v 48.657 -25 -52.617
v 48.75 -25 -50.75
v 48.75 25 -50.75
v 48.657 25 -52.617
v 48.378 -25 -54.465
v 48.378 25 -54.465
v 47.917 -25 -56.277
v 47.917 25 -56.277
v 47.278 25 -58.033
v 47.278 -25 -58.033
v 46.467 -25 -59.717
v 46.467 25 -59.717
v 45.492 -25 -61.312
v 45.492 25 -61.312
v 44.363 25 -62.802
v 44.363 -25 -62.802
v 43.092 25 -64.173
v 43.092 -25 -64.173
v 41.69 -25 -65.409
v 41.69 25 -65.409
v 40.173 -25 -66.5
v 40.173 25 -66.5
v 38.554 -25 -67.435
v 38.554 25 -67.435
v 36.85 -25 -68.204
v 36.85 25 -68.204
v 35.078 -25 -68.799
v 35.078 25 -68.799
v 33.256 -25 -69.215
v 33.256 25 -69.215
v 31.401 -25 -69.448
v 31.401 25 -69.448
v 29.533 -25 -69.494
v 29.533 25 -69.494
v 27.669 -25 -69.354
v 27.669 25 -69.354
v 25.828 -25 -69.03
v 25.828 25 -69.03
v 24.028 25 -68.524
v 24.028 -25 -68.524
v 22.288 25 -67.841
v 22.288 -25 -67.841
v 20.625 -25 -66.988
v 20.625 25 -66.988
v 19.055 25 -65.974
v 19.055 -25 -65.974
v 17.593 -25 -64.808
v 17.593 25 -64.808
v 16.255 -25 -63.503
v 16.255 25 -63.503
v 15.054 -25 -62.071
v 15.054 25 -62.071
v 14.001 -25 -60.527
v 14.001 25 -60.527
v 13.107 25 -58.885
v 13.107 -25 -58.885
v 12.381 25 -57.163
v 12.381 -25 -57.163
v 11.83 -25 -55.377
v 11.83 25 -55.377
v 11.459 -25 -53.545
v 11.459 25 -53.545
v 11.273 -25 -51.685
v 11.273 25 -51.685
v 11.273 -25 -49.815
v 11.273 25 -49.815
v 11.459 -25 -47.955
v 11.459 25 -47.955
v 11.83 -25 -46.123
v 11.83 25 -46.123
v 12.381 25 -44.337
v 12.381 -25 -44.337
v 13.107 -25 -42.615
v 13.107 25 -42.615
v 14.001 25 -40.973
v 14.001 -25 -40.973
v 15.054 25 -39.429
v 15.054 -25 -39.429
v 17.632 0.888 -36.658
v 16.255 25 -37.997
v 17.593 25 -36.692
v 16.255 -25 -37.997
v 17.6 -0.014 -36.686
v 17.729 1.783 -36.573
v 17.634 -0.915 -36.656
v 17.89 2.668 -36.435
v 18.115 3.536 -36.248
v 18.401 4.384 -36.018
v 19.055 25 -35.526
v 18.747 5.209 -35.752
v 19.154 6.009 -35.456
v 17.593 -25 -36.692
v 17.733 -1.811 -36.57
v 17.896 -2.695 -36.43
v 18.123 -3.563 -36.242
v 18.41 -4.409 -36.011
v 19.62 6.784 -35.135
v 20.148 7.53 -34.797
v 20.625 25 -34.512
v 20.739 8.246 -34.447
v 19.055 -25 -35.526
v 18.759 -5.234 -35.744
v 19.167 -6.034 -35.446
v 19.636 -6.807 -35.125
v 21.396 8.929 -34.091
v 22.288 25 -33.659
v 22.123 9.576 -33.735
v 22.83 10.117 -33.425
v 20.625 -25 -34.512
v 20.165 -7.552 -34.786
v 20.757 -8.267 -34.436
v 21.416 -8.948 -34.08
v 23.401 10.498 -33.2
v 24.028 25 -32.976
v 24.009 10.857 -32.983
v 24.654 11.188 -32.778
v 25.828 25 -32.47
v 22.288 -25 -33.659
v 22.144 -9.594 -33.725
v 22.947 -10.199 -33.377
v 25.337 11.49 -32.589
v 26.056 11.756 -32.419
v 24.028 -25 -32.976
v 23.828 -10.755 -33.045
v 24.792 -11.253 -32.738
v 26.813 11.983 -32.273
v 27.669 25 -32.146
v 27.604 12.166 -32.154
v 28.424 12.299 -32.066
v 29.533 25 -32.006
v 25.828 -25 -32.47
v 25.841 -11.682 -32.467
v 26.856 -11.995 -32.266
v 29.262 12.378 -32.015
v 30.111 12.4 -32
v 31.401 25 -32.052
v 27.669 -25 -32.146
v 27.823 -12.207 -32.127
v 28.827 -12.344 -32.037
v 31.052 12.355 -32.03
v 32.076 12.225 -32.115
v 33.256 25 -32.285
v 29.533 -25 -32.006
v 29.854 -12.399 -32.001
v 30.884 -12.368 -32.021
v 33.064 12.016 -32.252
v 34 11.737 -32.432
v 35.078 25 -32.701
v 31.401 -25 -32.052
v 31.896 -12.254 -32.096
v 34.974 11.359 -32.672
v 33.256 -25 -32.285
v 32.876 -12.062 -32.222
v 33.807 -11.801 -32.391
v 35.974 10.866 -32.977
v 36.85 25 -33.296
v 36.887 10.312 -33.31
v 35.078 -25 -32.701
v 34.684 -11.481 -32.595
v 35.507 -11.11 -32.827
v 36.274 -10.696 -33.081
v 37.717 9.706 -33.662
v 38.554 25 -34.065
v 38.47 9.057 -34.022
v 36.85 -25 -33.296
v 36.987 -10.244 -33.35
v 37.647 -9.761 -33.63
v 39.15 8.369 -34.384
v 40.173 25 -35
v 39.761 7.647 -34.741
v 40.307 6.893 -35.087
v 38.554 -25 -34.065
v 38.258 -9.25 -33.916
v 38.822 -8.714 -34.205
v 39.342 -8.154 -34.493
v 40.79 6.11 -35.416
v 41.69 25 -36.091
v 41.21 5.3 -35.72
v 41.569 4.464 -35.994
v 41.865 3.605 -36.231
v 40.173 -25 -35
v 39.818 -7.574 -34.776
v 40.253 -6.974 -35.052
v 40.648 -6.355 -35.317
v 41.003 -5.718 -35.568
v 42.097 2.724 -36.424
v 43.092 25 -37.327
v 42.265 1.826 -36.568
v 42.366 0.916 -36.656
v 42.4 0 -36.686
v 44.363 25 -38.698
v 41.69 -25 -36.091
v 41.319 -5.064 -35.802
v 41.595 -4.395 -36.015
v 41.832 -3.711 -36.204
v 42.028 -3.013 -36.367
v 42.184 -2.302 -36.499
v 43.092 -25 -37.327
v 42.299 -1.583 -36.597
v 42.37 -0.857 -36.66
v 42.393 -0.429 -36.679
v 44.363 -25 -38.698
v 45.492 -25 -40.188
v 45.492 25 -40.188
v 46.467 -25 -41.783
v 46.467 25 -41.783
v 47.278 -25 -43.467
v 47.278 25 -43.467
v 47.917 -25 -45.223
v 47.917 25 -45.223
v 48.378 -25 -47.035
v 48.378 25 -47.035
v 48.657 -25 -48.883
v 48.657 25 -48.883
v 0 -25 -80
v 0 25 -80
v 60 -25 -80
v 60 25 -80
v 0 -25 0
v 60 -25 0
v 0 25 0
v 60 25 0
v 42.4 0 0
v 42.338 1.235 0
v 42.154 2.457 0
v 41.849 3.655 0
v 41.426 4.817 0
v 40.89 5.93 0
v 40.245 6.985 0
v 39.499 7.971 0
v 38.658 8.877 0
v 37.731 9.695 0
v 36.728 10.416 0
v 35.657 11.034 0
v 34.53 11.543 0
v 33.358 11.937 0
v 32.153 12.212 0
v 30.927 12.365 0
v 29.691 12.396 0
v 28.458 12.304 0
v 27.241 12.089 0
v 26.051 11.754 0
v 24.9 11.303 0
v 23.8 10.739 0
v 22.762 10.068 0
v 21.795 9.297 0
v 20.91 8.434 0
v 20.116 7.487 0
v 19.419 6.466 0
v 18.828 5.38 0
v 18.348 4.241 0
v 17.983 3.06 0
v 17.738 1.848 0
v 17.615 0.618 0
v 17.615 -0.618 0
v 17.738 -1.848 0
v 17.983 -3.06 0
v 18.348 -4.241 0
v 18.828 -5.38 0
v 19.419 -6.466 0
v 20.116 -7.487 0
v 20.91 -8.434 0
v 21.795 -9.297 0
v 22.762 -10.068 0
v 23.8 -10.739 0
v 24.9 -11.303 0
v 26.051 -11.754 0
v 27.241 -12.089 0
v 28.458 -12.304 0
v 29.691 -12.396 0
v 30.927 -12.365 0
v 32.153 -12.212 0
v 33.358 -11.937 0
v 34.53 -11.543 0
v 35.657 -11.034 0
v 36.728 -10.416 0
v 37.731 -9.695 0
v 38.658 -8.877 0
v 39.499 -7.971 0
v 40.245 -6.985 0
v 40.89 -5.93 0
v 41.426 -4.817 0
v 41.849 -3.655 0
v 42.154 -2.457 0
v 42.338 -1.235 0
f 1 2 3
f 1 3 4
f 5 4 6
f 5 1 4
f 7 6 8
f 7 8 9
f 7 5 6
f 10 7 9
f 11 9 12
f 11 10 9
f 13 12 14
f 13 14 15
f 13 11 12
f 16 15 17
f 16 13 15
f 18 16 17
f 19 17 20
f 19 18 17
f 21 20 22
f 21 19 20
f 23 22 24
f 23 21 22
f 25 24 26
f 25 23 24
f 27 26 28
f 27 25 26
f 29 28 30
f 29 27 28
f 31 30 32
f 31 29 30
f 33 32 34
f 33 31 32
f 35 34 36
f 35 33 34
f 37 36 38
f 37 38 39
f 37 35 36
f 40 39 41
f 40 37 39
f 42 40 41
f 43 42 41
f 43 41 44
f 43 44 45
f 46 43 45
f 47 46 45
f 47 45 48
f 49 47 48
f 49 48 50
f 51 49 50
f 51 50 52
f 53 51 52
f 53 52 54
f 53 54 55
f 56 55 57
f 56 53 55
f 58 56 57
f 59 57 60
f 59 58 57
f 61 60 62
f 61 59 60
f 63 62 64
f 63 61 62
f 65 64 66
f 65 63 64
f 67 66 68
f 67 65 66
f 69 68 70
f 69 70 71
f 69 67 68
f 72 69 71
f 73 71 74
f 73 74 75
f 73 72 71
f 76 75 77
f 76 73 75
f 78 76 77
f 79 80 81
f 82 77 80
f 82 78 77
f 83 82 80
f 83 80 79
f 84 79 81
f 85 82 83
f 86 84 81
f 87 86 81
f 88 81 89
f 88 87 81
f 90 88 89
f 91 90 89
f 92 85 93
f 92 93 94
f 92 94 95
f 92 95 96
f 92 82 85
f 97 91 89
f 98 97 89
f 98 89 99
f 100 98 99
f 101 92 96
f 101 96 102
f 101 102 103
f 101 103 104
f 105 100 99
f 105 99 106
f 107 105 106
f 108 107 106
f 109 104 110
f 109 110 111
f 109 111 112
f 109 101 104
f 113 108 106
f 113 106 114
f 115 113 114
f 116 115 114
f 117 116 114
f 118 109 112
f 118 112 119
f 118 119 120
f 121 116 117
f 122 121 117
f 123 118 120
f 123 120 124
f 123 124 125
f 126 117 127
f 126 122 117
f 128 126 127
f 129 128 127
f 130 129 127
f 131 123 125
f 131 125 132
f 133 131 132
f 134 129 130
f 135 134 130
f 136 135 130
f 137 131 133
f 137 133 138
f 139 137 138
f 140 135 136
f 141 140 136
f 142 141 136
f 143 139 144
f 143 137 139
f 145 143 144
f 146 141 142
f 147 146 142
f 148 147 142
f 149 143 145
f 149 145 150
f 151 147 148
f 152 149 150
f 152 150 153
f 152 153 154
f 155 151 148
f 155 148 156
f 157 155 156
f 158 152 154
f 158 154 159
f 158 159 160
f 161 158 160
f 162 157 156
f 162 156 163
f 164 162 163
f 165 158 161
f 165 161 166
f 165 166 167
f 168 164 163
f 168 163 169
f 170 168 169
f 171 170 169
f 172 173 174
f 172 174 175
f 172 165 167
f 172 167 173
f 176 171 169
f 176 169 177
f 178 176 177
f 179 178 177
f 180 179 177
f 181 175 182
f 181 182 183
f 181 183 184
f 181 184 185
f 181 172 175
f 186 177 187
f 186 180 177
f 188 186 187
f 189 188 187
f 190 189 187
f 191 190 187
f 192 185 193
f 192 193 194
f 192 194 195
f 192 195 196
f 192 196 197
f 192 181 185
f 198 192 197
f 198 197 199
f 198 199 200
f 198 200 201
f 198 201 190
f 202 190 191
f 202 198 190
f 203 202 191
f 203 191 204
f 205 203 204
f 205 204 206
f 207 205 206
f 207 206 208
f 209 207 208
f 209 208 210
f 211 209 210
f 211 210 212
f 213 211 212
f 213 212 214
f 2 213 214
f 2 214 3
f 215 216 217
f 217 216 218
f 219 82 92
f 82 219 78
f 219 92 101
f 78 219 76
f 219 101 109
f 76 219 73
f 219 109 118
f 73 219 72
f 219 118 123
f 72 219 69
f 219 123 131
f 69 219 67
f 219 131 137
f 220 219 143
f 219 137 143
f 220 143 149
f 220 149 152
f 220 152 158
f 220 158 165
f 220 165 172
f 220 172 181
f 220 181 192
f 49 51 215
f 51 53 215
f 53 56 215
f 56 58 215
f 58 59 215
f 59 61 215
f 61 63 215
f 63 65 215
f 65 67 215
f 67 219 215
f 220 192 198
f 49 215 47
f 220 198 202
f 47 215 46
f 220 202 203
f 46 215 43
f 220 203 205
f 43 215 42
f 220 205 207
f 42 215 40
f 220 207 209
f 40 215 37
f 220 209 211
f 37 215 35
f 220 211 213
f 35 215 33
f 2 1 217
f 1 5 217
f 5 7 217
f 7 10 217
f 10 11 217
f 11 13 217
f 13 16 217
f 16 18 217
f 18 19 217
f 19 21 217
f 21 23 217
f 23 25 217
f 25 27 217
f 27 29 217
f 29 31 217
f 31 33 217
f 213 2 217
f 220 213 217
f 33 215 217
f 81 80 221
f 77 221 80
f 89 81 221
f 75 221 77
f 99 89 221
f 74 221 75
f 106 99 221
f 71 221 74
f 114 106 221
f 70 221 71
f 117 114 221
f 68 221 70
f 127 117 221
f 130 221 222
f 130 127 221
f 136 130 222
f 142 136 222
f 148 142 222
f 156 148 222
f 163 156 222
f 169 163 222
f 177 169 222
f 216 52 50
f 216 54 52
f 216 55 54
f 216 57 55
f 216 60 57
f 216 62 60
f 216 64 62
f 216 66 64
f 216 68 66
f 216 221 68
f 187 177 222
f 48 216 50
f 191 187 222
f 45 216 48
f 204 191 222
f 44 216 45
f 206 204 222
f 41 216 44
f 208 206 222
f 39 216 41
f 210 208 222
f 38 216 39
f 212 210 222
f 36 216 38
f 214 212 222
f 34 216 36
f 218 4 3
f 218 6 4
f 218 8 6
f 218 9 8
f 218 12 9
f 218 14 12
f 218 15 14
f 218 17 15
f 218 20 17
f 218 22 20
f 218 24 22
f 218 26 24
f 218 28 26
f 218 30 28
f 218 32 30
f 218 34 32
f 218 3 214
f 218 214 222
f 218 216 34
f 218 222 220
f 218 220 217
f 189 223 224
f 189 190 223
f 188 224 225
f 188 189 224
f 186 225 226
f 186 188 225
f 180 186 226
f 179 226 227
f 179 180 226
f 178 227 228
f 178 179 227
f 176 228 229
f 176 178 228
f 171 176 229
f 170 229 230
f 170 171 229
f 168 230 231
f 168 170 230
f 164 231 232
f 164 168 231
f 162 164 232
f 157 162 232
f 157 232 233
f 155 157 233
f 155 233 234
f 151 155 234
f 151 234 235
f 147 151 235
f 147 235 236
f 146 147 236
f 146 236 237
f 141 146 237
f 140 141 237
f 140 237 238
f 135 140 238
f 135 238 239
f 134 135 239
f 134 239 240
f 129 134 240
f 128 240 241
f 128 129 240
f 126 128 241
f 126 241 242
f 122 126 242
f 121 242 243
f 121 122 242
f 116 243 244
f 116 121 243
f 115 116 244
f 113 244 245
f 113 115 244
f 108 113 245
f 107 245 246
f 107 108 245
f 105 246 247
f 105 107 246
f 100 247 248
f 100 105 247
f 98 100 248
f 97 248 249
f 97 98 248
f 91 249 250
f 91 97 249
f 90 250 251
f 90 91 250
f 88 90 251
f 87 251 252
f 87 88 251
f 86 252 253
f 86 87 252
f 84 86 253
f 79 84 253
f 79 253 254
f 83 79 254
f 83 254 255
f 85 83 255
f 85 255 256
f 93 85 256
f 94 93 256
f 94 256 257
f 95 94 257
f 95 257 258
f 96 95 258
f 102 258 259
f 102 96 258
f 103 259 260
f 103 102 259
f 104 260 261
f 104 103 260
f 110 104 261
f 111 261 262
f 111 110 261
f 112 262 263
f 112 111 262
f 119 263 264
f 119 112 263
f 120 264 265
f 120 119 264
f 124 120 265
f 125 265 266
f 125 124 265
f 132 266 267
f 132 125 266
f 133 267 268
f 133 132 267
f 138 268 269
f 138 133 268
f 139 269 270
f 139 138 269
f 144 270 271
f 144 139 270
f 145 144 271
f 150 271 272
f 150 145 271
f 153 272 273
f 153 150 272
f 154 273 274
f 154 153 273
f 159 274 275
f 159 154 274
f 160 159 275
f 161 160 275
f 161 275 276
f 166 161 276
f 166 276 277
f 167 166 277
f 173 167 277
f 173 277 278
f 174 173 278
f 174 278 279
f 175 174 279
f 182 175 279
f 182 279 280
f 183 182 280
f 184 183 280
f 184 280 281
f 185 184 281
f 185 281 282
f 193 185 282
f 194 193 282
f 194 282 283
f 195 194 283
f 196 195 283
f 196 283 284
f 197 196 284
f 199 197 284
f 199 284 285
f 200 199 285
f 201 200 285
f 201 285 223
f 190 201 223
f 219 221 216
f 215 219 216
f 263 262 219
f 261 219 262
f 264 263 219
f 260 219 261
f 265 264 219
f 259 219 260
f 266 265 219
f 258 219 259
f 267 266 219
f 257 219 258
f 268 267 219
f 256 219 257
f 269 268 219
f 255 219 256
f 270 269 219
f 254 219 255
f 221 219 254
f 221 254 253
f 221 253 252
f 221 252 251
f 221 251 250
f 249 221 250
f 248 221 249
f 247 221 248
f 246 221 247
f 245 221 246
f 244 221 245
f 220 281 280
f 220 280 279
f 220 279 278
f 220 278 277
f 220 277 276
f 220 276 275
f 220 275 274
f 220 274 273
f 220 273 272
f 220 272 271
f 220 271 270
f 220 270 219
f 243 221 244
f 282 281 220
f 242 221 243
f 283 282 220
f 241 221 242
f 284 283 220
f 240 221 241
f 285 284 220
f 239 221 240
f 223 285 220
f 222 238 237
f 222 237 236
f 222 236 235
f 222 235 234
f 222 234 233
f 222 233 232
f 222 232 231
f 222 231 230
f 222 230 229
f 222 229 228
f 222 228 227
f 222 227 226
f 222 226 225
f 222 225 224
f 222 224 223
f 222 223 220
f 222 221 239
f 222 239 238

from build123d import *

# Parameters (mm, degrees)
SKETCH1_W           = 60
SKETCH1_H           = 80
SKETCH1_R           = 18.75
BOSS_EXTRUDE1_DEPTH = 25
SKETCH4_R           = 12.4
CUT_EXTRUDE1_DEPTH  = 51.75


with BuildPart() as part:
    # Sketch1 → Boss-Extrude1 (new body, symmetric)
    with BuildSketch(Plane(origin=(0, 0, 0), x_dir=(1, 0, 0), z_dir=(0, 1, 0))):
        with Locations((30, 40)):
            Rectangle(SKETCH1_W, SKETCH1_H)
        with Locations((30, 50.75)):
            Circle(SKETCH1_R, mode=Mode.SUBTRACT)
    extrude(amount=BOSS_EXTRUDE1_DEPTH, both=True)

    # Sketch4 → Cut-Extrude1 (cut, through all)
    with BuildSketch(Plane.XY.offset(-50.75)):
        with Locations((30, 0)):
            Circle(SKETCH4_R)
    extrude(amount=CUT_EXTRUDE1_DEPTH, mode=Mode.SUBTRACT)


solid = part.part
